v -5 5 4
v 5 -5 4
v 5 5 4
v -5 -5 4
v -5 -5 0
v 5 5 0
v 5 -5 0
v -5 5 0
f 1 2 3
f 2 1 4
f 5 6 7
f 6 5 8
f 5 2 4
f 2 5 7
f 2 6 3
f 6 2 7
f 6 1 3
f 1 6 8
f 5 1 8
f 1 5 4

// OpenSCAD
// Frozen test fixture for live-download naming (pst-fcjqj): one enum param
// carries the bare `filename` flag, so /api/export names the STL
// filename_flag-<style>.stl like scripts/export-all.py's baked grid.
// Library-free and tiny so the route test's wasm render stays fast.

$fn = 16;
PRINT_ANCHOR_BBOX = [10, 10, 4];

// === User-tunable parameters ===
style = "square"; // @param enum choices=square|round label="Style" filename
size  = 10;       // @param number min=5 max=20 step=1 label="Size (mm)"
// === Geometry ===

if (style == "round") cylinder(h = 4, d = size);
else translate([-size / 2, -size / 2, 0]) cube([size, size, 4]);
